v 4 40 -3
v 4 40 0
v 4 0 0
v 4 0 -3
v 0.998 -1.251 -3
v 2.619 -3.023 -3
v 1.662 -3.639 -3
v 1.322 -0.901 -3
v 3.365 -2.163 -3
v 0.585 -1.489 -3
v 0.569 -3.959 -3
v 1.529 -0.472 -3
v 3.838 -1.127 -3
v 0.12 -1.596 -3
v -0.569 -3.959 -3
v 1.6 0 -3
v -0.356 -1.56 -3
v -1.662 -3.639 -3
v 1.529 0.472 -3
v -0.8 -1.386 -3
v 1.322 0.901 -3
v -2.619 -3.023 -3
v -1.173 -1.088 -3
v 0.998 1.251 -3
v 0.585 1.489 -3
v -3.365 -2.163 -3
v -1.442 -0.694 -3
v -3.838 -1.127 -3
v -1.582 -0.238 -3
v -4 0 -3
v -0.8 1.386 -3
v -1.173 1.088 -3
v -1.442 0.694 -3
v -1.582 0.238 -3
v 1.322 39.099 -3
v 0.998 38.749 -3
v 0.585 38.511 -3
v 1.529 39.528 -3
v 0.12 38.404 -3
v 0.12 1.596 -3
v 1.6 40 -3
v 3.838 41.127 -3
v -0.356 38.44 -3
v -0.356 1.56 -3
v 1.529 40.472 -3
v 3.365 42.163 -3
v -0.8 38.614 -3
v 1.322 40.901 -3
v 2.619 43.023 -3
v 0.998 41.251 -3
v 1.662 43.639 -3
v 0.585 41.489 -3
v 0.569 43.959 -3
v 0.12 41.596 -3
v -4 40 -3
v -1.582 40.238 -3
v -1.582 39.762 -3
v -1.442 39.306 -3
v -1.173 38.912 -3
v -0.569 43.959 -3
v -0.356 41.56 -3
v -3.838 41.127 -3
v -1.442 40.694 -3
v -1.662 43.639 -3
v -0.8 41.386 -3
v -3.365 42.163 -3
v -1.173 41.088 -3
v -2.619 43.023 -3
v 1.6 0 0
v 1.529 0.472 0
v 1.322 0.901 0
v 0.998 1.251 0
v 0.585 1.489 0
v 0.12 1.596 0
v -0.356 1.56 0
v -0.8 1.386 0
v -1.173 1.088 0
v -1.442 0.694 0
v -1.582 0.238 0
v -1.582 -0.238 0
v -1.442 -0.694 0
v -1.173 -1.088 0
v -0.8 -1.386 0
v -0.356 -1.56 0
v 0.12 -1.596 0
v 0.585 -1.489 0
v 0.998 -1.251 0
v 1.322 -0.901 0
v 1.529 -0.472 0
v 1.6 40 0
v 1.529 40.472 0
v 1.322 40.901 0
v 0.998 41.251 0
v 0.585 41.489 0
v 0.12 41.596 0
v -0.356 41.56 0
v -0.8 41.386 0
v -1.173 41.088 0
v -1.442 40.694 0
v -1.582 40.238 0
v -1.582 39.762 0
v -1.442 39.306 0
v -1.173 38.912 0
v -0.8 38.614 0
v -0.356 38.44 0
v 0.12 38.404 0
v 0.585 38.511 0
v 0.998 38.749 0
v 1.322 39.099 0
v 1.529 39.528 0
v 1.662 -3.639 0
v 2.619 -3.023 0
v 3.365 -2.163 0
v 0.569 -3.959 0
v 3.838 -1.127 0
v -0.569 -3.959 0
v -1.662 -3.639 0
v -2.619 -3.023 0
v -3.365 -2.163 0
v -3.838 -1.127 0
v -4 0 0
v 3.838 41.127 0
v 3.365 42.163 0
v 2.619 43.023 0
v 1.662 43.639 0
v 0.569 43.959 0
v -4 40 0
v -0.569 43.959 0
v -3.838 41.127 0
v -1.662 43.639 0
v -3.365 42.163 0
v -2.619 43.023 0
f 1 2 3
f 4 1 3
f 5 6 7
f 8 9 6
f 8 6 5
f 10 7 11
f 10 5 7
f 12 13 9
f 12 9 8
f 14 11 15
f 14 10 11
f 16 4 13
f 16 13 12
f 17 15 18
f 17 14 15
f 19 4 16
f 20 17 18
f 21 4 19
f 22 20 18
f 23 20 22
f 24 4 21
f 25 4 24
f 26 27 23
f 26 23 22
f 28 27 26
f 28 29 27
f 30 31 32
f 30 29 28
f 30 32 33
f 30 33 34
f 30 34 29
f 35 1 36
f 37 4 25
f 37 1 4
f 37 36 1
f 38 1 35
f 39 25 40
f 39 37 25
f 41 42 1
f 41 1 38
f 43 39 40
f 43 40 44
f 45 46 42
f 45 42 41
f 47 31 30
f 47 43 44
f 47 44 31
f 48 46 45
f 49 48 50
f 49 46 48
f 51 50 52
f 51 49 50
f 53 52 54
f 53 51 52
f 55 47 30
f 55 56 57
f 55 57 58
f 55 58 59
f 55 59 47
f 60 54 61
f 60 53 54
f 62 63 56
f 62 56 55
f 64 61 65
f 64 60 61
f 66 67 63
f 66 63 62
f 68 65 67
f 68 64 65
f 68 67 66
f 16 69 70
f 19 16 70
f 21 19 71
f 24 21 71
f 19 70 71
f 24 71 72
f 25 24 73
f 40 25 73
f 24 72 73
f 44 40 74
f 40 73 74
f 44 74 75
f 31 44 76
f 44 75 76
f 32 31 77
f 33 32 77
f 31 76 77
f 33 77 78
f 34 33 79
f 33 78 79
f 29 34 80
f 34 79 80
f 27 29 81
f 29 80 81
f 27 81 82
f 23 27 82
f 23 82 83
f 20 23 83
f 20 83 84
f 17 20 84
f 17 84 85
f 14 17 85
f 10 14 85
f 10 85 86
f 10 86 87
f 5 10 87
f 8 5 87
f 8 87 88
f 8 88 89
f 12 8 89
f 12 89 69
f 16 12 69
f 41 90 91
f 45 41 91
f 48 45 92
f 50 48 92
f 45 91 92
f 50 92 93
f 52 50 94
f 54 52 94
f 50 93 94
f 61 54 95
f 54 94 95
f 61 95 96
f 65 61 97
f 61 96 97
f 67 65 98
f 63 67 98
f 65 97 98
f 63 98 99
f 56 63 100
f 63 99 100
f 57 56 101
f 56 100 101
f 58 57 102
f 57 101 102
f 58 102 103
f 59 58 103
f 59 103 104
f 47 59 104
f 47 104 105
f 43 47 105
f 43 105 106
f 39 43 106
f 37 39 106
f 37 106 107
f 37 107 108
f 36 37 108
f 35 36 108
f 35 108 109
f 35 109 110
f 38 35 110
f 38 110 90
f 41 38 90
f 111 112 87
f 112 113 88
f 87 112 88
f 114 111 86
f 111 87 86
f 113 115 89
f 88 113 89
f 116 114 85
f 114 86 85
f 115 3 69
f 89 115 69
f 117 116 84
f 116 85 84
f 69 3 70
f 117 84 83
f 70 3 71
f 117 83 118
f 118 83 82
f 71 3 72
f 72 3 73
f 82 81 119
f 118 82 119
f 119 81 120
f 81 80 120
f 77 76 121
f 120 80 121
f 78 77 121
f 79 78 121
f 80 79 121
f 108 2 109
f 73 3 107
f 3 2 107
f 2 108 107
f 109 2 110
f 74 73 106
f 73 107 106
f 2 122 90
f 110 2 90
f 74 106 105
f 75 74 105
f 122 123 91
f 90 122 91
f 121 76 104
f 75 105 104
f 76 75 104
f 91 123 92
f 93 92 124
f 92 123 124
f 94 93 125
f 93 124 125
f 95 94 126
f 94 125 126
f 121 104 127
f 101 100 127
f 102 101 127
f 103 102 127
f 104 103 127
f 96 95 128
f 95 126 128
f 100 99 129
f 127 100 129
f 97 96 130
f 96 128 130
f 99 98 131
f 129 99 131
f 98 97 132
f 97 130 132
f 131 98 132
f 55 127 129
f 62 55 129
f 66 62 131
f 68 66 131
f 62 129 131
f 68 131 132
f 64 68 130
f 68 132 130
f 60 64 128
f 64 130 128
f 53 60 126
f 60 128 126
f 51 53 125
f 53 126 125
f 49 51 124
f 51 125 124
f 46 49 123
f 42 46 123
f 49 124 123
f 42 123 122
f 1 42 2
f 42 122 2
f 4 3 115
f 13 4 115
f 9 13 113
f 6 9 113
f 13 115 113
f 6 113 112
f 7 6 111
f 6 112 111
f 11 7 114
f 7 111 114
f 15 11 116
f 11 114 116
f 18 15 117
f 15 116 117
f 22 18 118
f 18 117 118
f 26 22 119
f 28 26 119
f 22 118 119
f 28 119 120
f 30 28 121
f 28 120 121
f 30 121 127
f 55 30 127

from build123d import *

# Parameters (mm, degrees)
BOSS_EXTRUDE1_DEPTH = 3
SKETCH3_R           = 1.6
CUT_EXTRUDE1_DEPTH  = 4


with BuildPart() as part:
    # Sketch1 → Boss-Extrude1 (new body)
    with BuildSketch(Plane.XY):
        with BuildLine():
            Line((-4, 0), (-4, 40))
            ThreePointArc((-4, 40), (0, 44), (4, 40))
            Line((4, 40), (4, 0))
            ThreePointArc((4, 0), (0, -4), (-4, 0))
        make_face()
    extrude(amount=-BOSS_EXTRUDE1_DEPTH)

    # Sketch3 → Cut-Extrude1 (cut, through all)
    with BuildSketch(Plane.XY):
        Circle(SKETCH3_R)
        with Locations((0, 40)):
            Circle(SKETCH3_R)
    extrude(amount=-CUT_EXTRUDE1_DEPTH, mode=Mode.SUBTRACT)


solid = part.part
